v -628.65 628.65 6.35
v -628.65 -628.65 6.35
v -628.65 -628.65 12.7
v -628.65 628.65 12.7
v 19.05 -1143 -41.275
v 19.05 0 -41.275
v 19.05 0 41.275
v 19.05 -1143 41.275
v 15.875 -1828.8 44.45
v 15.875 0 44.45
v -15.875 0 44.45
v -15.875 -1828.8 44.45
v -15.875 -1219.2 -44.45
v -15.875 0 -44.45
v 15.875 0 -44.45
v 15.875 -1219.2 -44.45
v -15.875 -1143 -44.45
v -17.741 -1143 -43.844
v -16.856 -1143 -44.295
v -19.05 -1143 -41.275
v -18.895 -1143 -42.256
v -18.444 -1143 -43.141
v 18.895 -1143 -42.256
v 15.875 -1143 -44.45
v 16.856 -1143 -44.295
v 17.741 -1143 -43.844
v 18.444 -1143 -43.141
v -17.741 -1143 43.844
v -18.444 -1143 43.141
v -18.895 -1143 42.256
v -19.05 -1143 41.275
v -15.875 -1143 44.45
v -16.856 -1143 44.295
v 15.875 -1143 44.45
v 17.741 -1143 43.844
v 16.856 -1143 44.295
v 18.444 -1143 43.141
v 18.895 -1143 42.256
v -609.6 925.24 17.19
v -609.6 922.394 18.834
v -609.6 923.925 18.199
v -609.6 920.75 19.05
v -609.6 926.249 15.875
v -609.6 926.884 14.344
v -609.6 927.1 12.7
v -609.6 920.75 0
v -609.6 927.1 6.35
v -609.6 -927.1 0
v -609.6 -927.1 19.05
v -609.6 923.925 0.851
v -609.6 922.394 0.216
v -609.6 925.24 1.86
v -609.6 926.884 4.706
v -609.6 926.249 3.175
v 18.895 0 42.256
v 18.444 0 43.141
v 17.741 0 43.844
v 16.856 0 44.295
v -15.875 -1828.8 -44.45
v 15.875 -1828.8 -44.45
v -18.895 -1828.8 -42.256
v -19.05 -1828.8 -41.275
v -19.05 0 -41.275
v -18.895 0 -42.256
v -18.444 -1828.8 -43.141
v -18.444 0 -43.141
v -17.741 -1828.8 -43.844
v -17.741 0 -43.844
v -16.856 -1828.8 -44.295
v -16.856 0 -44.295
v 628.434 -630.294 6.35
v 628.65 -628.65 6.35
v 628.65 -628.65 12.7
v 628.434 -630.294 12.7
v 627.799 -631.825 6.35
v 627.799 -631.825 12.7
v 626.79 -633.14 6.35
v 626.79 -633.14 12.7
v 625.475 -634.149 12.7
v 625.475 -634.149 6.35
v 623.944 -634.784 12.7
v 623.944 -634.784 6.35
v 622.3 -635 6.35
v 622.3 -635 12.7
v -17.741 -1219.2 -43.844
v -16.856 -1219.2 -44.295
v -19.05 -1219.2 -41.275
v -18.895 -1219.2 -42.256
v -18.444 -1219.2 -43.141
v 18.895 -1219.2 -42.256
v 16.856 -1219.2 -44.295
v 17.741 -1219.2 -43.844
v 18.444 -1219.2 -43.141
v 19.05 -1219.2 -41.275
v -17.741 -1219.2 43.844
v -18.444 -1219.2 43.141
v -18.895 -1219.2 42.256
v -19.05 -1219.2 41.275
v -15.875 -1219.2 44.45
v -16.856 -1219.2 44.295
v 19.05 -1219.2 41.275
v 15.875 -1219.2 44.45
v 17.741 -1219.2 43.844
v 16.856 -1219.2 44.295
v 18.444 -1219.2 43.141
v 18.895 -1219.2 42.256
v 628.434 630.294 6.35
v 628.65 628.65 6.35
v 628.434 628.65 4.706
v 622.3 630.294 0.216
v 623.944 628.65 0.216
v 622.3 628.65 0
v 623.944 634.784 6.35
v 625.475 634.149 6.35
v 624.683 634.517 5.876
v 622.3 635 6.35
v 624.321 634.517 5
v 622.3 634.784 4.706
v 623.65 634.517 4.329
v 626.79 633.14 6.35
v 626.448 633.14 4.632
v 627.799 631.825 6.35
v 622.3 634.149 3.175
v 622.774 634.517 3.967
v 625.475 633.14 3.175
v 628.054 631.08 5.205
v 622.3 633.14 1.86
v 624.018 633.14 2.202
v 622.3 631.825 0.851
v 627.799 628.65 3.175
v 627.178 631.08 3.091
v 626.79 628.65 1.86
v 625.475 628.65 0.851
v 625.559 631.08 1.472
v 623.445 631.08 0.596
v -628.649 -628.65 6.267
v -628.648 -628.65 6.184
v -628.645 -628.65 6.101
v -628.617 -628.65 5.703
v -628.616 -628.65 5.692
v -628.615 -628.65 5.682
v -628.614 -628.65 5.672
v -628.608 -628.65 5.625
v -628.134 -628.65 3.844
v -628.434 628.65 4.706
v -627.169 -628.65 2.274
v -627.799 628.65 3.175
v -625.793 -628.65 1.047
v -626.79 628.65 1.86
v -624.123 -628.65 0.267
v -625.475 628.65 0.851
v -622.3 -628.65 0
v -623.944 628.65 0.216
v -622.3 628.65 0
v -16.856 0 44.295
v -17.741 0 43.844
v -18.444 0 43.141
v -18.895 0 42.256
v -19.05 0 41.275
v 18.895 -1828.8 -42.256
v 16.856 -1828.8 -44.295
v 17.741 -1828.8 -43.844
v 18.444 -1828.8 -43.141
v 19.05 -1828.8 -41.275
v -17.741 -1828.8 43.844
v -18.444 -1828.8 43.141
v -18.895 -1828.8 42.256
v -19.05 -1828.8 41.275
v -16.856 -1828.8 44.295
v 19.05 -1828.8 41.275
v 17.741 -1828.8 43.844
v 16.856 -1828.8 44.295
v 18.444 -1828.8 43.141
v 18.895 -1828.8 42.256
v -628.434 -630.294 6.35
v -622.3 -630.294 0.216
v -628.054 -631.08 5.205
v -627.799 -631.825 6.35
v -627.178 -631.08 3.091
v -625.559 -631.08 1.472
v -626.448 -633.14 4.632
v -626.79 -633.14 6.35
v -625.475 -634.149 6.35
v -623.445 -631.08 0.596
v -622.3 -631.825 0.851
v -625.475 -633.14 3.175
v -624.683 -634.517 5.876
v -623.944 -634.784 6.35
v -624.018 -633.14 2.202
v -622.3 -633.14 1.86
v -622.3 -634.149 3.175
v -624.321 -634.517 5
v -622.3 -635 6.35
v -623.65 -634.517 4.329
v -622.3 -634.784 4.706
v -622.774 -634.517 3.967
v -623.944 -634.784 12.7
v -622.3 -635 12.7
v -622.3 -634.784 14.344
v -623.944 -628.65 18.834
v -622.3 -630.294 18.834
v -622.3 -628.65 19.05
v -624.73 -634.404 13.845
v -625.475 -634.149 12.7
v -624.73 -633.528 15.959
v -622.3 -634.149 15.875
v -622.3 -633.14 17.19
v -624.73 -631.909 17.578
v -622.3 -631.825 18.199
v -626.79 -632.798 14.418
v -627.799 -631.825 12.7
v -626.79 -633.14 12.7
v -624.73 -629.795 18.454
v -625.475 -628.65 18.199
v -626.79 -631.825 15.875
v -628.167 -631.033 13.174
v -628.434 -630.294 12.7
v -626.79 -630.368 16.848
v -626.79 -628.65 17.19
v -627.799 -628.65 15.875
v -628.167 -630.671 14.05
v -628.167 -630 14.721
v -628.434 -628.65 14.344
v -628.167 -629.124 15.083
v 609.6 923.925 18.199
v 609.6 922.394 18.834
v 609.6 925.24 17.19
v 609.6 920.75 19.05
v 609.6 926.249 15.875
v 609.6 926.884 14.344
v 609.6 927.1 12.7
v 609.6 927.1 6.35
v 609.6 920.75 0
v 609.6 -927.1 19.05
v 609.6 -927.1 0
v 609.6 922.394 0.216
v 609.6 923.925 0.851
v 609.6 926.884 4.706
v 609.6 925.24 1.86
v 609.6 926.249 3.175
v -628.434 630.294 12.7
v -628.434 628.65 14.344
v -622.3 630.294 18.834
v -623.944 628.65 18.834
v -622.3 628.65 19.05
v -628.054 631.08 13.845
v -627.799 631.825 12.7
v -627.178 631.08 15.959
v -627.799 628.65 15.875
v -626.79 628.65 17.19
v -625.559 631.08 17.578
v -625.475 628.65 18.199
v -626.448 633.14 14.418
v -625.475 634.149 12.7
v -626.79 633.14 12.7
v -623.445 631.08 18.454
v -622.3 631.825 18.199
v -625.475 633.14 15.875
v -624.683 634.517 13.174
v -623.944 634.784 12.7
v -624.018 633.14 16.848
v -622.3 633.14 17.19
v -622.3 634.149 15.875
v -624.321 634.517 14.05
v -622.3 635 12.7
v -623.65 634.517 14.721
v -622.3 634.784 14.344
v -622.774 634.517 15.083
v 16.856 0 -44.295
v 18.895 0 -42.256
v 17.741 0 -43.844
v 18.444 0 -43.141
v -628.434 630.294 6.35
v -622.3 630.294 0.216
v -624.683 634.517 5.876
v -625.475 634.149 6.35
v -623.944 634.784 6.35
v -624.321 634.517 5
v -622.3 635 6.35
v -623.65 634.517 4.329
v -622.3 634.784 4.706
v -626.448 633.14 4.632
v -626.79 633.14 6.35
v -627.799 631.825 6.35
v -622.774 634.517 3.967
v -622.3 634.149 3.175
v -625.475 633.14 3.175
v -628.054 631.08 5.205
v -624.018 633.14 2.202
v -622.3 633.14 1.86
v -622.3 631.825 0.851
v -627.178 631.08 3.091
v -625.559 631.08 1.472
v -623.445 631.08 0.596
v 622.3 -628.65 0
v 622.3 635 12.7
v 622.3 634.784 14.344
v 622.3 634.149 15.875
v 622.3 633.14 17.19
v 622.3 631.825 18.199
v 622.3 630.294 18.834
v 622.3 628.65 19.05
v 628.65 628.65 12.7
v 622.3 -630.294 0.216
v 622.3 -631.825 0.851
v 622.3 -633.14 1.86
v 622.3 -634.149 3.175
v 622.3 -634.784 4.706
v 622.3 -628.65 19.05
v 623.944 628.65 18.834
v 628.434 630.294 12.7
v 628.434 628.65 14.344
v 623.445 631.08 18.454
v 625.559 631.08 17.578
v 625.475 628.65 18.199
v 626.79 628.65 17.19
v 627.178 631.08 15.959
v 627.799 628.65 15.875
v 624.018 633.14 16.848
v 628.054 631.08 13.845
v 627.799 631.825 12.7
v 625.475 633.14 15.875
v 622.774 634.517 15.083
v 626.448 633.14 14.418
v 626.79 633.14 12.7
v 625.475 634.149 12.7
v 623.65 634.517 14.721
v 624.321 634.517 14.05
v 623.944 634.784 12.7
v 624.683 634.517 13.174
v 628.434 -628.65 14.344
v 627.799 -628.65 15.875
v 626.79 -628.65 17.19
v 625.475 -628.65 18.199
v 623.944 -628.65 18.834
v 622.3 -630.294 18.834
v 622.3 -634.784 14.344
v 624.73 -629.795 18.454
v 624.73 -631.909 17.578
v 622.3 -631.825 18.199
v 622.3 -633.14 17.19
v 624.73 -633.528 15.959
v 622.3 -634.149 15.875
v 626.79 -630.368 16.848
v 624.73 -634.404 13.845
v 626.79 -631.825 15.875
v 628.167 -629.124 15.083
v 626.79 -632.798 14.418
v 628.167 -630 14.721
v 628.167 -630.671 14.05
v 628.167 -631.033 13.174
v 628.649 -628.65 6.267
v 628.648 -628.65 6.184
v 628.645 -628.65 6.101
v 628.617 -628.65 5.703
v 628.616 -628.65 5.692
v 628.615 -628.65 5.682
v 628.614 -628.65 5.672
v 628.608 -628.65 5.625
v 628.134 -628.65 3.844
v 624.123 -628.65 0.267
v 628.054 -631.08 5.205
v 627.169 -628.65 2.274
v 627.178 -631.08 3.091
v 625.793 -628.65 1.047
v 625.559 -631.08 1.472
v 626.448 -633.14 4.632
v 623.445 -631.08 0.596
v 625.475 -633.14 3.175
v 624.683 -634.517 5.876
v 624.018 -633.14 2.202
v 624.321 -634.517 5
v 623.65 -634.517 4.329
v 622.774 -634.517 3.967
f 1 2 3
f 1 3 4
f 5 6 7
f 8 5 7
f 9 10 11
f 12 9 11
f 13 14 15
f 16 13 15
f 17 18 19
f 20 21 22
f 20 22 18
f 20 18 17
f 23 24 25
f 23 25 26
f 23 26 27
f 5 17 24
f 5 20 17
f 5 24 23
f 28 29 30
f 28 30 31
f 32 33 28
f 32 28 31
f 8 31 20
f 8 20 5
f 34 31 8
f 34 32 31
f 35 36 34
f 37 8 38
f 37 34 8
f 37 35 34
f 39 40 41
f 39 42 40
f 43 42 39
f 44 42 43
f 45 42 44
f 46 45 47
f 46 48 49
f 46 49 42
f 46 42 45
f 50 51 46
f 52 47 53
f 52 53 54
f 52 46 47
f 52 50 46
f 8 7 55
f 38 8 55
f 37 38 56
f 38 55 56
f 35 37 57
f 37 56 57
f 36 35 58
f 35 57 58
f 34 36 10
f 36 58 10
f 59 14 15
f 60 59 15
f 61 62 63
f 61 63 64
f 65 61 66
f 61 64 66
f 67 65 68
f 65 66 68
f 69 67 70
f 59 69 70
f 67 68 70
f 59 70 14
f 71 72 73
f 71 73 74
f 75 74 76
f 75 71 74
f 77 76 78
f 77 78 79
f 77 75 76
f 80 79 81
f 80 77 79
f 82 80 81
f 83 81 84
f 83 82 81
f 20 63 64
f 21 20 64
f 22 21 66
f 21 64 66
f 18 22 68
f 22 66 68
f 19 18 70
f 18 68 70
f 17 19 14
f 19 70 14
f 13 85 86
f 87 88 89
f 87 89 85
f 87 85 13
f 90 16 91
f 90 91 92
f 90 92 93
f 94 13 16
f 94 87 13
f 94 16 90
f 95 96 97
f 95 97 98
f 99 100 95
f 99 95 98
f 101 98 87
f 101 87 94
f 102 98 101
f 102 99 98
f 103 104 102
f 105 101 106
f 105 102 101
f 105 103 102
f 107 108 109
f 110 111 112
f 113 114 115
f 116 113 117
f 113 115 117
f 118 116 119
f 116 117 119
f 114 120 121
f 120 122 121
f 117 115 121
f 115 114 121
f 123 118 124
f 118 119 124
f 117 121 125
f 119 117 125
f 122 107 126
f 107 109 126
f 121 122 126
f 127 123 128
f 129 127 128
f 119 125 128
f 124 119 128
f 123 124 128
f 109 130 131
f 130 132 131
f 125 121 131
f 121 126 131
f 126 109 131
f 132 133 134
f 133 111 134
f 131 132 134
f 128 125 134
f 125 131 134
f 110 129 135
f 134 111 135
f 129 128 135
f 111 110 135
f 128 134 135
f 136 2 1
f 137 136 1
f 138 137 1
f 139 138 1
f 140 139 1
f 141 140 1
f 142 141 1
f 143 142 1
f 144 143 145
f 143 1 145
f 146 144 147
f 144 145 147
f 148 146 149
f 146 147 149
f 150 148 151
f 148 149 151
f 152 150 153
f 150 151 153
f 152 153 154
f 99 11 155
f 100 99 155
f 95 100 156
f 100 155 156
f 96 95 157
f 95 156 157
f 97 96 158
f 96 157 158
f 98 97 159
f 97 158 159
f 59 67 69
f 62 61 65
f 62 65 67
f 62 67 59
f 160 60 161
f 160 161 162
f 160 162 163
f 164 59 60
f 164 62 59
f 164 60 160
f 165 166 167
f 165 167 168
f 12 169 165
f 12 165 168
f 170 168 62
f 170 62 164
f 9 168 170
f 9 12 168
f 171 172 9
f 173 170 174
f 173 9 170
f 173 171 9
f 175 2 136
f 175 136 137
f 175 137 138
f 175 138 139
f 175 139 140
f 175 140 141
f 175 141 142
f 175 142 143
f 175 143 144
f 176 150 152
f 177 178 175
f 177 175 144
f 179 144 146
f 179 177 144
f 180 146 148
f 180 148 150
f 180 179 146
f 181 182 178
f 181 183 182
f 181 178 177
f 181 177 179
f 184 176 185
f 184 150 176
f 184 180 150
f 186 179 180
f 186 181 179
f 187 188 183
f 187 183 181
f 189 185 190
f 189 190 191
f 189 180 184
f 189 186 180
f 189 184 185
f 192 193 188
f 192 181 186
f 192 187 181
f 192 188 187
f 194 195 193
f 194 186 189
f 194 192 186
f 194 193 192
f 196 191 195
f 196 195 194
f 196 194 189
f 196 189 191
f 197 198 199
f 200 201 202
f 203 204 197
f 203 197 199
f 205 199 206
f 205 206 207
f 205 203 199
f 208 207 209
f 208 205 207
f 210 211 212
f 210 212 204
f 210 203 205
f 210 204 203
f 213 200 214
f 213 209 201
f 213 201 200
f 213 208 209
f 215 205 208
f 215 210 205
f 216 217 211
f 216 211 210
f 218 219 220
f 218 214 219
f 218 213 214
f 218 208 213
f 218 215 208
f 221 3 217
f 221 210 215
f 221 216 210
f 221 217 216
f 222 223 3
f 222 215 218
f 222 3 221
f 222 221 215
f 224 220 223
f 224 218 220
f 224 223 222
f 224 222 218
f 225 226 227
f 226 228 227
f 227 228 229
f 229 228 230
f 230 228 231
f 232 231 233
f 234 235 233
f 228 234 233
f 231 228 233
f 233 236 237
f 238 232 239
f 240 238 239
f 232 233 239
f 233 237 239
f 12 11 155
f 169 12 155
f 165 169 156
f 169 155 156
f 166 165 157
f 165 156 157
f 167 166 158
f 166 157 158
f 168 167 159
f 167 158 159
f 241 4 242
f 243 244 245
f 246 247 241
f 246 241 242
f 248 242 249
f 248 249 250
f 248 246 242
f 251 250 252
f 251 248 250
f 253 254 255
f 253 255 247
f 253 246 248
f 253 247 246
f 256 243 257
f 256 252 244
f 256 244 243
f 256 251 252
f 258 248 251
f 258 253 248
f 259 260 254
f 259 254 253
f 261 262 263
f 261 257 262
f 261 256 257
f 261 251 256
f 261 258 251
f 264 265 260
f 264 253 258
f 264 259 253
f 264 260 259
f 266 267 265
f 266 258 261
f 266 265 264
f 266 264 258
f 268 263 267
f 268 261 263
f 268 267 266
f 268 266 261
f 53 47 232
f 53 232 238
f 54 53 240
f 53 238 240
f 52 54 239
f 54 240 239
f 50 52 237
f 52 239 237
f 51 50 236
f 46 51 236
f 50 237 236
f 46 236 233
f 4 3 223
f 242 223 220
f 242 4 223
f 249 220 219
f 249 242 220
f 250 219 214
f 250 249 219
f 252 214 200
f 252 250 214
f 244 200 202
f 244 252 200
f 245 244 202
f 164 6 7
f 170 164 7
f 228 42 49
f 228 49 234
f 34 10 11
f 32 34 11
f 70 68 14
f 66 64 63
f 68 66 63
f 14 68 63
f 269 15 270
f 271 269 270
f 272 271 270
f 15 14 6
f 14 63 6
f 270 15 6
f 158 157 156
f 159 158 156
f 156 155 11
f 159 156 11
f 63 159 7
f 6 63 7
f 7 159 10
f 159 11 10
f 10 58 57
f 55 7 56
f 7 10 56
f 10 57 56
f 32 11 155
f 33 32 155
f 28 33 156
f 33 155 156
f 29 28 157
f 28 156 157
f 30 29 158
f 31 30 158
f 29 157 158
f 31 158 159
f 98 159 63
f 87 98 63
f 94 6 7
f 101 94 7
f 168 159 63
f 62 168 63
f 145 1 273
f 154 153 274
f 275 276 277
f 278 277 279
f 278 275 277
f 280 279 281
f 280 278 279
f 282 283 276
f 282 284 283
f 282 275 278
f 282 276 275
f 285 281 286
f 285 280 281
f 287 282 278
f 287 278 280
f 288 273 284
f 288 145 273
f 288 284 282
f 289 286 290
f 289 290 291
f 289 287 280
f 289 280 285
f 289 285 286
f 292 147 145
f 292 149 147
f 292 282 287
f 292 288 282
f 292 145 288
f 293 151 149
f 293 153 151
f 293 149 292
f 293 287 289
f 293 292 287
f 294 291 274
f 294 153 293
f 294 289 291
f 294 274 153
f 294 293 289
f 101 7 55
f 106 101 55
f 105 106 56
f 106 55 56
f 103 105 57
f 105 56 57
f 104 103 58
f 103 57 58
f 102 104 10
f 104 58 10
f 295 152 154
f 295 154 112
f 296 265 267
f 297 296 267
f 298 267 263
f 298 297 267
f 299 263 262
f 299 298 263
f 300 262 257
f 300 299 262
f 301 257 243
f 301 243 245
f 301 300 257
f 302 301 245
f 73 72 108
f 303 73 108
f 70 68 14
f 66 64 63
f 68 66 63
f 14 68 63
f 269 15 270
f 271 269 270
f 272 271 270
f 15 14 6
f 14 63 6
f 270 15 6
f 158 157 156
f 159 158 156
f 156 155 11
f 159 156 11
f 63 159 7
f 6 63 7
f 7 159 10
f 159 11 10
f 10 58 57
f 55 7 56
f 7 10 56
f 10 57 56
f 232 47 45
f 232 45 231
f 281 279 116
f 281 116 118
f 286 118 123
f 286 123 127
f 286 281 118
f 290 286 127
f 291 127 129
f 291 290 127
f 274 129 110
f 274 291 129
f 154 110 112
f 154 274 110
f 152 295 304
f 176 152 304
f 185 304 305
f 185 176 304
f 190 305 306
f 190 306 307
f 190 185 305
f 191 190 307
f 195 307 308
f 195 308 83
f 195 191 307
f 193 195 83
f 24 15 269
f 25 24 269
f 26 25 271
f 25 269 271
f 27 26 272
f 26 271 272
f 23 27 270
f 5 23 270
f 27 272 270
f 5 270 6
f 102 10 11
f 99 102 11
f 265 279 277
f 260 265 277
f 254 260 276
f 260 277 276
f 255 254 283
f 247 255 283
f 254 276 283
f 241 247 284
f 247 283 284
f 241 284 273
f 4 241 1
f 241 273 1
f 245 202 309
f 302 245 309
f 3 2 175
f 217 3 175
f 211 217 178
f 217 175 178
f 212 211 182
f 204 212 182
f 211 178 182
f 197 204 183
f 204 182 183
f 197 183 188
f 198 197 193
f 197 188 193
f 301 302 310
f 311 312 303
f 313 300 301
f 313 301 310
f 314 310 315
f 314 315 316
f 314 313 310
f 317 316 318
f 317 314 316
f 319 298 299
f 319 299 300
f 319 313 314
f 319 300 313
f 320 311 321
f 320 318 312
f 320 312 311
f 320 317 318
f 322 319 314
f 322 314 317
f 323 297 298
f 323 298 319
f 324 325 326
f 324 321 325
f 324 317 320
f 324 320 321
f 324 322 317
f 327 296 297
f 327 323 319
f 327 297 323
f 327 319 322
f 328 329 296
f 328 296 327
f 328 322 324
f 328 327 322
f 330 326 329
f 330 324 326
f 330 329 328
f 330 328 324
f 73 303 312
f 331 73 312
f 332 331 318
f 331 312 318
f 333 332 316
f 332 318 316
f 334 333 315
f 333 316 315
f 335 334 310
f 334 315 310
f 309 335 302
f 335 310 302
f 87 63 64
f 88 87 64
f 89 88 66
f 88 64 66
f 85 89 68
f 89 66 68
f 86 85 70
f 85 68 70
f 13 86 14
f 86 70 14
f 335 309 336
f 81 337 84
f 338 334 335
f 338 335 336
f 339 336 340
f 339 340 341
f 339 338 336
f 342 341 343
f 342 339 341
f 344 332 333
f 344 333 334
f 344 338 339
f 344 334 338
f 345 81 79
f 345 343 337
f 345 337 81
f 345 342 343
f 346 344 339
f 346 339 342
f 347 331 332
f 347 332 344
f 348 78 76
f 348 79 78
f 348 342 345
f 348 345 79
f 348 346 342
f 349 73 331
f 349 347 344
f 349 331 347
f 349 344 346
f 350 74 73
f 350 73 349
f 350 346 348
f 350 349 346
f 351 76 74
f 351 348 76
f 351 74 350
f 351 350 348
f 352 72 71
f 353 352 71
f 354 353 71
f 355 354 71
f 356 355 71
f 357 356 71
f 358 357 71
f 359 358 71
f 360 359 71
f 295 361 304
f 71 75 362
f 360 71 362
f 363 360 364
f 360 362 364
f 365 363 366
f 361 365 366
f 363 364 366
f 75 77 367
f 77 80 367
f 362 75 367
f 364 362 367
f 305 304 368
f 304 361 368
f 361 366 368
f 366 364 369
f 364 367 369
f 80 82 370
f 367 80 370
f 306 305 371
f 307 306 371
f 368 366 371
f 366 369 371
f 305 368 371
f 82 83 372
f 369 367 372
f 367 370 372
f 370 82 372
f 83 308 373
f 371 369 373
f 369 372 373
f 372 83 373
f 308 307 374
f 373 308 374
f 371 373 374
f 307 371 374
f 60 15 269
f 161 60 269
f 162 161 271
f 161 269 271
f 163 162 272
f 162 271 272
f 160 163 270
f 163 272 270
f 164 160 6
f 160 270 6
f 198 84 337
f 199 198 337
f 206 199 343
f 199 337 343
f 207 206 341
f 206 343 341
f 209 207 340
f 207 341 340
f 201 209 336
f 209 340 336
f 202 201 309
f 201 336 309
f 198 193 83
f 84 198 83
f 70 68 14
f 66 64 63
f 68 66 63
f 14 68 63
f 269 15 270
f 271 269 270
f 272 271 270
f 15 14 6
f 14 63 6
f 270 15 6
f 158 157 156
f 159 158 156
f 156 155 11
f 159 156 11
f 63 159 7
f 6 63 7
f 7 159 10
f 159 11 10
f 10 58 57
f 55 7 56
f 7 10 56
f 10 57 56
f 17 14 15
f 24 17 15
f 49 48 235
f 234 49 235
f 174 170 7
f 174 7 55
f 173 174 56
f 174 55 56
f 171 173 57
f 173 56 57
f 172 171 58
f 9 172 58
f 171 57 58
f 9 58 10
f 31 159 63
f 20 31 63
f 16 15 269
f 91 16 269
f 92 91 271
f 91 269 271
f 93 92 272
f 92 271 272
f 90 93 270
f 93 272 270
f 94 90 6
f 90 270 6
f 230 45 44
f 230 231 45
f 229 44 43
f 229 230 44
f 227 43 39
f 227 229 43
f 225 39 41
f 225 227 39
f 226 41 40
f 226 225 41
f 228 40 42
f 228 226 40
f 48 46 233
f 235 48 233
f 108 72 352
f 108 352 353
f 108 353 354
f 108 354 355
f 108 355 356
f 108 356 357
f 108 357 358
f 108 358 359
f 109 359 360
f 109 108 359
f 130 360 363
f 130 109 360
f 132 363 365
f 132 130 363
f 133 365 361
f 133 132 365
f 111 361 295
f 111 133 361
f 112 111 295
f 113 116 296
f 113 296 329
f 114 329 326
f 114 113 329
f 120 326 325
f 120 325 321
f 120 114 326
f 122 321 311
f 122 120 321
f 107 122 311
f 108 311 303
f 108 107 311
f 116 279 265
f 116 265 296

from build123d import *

# Parameters (mm, degrees)
F1_DEPTH     = 1219.2
F2_DEPTH     = 1143
F3_W         = 1257.3
F3_H         = 1270
F4_DEPTH     = 19.05
F5_R         = 6.35
F6_T1_DEPTH  = 1244.6
F6_T3_DEPTH  = 6.35
F6_S7_W      = 6.477
F6_S7_H      = 6.477
F6_T8_DEPTH  = 6.477
F6_S13_W     = 6.477
F6_S13_H     = 6.477
F6_T14_DEPTH = 6.477
F6_S19_W     = 6.477
F6_S19_H     = 6.477
F6_T20_DEPTH = 6.477
F6_S25_W     = 6.477
F6_S25_H     = 6.477
F6_T26_DEPTH = 6.477
F6_T30_ANGLE = 90
F6_T32_ANGLE = 90
F6_T34_ANGLE = 90
F6_T36_ANGLE = 90
F7_DEPTH     = 1828.8
F8_W         = 1219.2
F8_H         = 1854.2
F9_DEPTH     = 19.05
F10_R        = 6.35


# Not quite as in the source:
# - a fillet or chamfer that OpenCascade refuses, or shapes differently, is made with other operations: its cross-section is extruded or revolved along the edge and cut away or added


with BuildPart() as f1:
    # F0 (on Front) → F1 (new body)
    with BuildSketch(Plane.XZ):
        with BuildLine():
            ThreePointArc((19.05, 41.275), (18.1200640303, 43.5200640303), (15.875, 44.45))
            Line((15.875, 44.45), (-15.875, 44.45))
            ThreePointArc((-15.875, 44.45), (-18.1200640303, 43.5200640303), (-19.05, 41.275))
            Line((-19.05, 41.275), (-19.05, -41.275))
            ThreePointArc((-19.05, -41.275), (-18.1200640303, -43.5200640303), (-15.875, -44.45))
            Line((-15.875, -44.45), (15.875, -44.45))
            ThreePointArc((15.875, -44.45), (18.1200640303, -43.5200640303), (19.05, -41.275))
            Line((19.05, -41.275), (19.05, 41.275))
        make_face()
    extrude(amount=F1_DEPTH)


with BuildPart() as f2:
    # F0 (on Front) → F2 (new body)
    with BuildSketch(Plane.XZ):
        with BuildLine():
            ThreePointArc((19.05, 41.275), (18.1200640303, 43.5200640303), (15.875, 44.45))
            Line((15.875, 44.45), (-15.875, 44.45))
            ThreePointArc((-15.875, 44.45), (-18.1200640303, 43.5200640303), (-19.05, 41.275))
            Line((-19.05, 41.275), (-19.05, -41.275))
            ThreePointArc((-19.05, -41.275), (-18.1200640303, -43.5200640303), (-15.875, -44.45))
            Line((-15.875, -44.45), (15.875, -44.45))
            ThreePointArc((15.875, -44.45), (18.1200640303, -43.5200640303), (19.05, -41.275))
            Line((19.05, -41.275), (19.05, 41.275))
        make_face()
    extrude(amount=F2_DEPTH)


with BuildPart() as f4:
    # F3 (on Top) → F4 (new body)
    with BuildSketch(Plane.XY):
        Rectangle(F3_W, F3_H)
    extrude(amount=F4_DEPTH)

    # F5
    f5_edges = [f4.edges().sort_by_distance(p)[0] for p in [
        (-628.65, 0, 19.05),
        (0, -635, 19.05),
        (0, 635, 19.05),
        (628.65, 0, 19.05),
        (628.65, 0, 0),
        (-628.65, 0, 0),
    ]]
    fillet(f5_edges, radius=F5_R)

    # F6: fillet of radius 6.35 on 2 edges, made by hand

    # F6_s2 → F6_t1 (cut)
    with BuildSketch(Plane.YZ.offset(-622.3)):
        with BuildLine():
            ThreePointArc((-628.65, 0), (-633.1401280605, 1.8598719395), (-635, 6.35))
            Line((-635, 6.35), (-635.127, 6.35))
            Line((-635.127, 6.35), (-635.127, -0.127))
            Line((-635.127, -0.127), (-628.65, -0.127))
            Line((-628.65, -0.127), (-628.65, 0))
        make_face()
        with BuildLine():
            ThreePointArc((635, 6.35), (633.1401280605, 1.8598719395), (628.65, 0))
            Line((628.65, 0), (628.65, -0.127))
            Line((628.65, -0.127), (635.127, -0.127))
            Line((635.127, -0.127), (635.127, 6.35))
            Line((635.127, 6.35), (635, 6.35))
        make_face()
    extrude(amount=F6_T1_DEPTH, mode=Mode.SUBTRACT)

    # F6_s4 → F6_t3 (cut)
    with BuildSketch(Plane.XY.offset(6.35)):
        with BuildLine():
            ThreePointArc((-622.3, 635), (-626.7901280605, 633.1401280605), (-628.65, 628.65))
            Line((-628.65, 628.65), (-628.777, 628.65))
            Line((-628.777, 628.65), (-628.777, 635.127))
            Line((-628.777, 635.127), (-622.3, 635.127))
            Line((-622.3, 635.127), (-622.3, 635))
        make_face()
        with BuildLine():
            ThreePointArc((622.3, 635), (626.7901280605, 633.1401280605), (628.65, 628.65))
            Line((628.65, 628.65), (628.777, 628.65))
            Line((628.777, 628.65), (628.777, 635.127))
            Line((628.777, 635.127), (622.3, 635.127))
            Line((622.3, 635.127), (622.3, 635))
        make_face()
        with BuildLine():
            ThreePointArc((628.65, -628.65), (626.7901280605, -633.1401280605), (622.3, -635))
            Line((622.3, -635), (622.3, -635.127))
            Line((622.3, -635.127), (628.777, -635.127))
            Line((628.777, -635.127), (628.777, -628.65))
            Line((628.777, -628.65), (628.65, -628.65))
        make_face()
        with BuildLine():
            ThreePointArc((-628.65, -628.65), (-626.7901280605, -633.1401280605), (-622.3, -635))
            Line((-622.3, -635), (-622.3, -635.127))
            Line((-622.3, -635.127), (-628.777, -635.127))
            Line((-628.777, -635.127), (-628.777, -628.65))
            Line((-628.777, -628.65), (-628.65, -628.65))
        make_face()
    extrude(amount=F6_T3_DEPTH, mode=Mode.SUBTRACT)


with BuildPart() as f6_tool6:
    # F6_s7 → F6_t8 (new body)
    with BuildSketch(Plane.XZ.offset(-628.65)):
        with Locations((-625.5385, 15.9385)):
            Rectangle(F6_S7_W, F6_S7_H)
    extrude(amount=-F6_T8_DEPTH)

    # F6_s9 → F6_t10 (revolve, cut)
    with BuildSketch(Plane(origin=(-622.3, 628.65, 12.7), x_dir=(0.7071067812, 0, -0.7071067812), z_dir=(0.7071067812, 0, 0.7071067812))):
        with BuildLine():
            ThreePointArc((0, -6.35), (6.35, 0), (0, 6.35))
            Line((0, 6.35), (0, -6.35))
        make_face()
    revolve(axis=Axis((-622.3, 628.65, 12.7), (0, 1, 0)), mode=Mode.SUBTRACT)


with BuildPart() as f4_1:
    add(f4.part)

    # F6_t5: cut F6_tool6
    add(f6_tool6.part, mode=Mode.SUBTRACT)


with BuildPart() as f6_tool12:
    # F6_s13 → F6_t14 (new body)
    with BuildSketch(Plane.XZ.offset(-628.65)):
        with Locations((625.5385, 15.9385)):
            Rectangle(F6_S13_W, F6_S13_H)
    extrude(amount=-F6_T14_DEPTH)

    # F6_s15 → F6_t16 (revolve, cut)
    with BuildSketch(Plane(origin=(622.3, 628.65, 12.7), x_dir=(-0.7071067812, 0, -0.7071067812), z_dir=(0.7071067812, 0, -0.7071067812))):
        with BuildLine():
            ThreePointArc((0, -6.35), (6.35, 0), (0, 6.35))
            Line((0, 6.35), (0, -6.35))
        make_face()
    revolve(axis=Axis((622.3, 628.65, 12.7), (0, 1, 0)), mode=Mode.SUBTRACT)


with BuildPart() as f4_2:
    add(f4_1.part)

    # F6_t11: cut F6_tool12
    add(f6_tool12.part, mode=Mode.SUBTRACT)


with BuildPart() as f6_tool18:
    # F6_s19 → F6_t20 (new body)
    with BuildSketch(Plane.YZ.offset(622.3)):
        with Locations((-631.8885, 15.9385)):
            Rectangle(F6_S19_W, F6_S19_H)
    extrude(amount=F6_T20_DEPTH)

    # F6_s21 → F6_t22 (revolve, cut)
    with BuildSketch(Plane(origin=(622.3, -628.65, 12.7), x_dir=(0, 0.7071067812, -0.7071067812), z_dir=(0, -0.7071067812, -0.7071067812))):
        with BuildLine():
            ThreePointArc((0, -6.35), (6.35, 0), (0, 6.35))
            Line((0, 6.35), (0, -6.35))
        make_face()
    revolve(axis=Axis((622.3, -628.65, 12.7), (1, 0, 0)), mode=Mode.SUBTRACT)


with BuildPart() as f4_3:
    add(f4_2.part)

    # F6_t17: cut F6_tool18
    add(f6_tool18.part, mode=Mode.SUBTRACT)


with BuildPart() as f6_tool24:
    # F6_s25 → F6_t26 (new body)
    with BuildSketch(Plane.YZ.offset(-622.3)):
        with Locations((-631.8885, 15.9385)):
            Rectangle(F6_S25_W, F6_S25_H)
    extrude(amount=-F6_T26_DEPTH)

    # F6_s27 → F6_t28 (revolve, cut)
    with BuildSketch(Plane(origin=(-622.3, -628.65, 12.7), x_dir=(0, 0.7071067812, -0.7071067812), z_dir=(0, 0.7071067812, 0.7071067812))):
        with BuildLine():
            ThreePointArc((0, -6.35), (6.35, 0), (0, 6.35))
            Line((0, 6.35), (0, -6.35))
        make_face()
    revolve(axis=Axis((-622.3, -628.65, 12.7), (-1, 0, 0)), mode=Mode.SUBTRACT)


with BuildPart() as f4_4:
    add(f4_3.part)

    # F6_t23: cut F6_tool24
    add(f6_tool24.part, mode=Mode.SUBTRACT)

    # F6_s29 → F6_t30 (revolve, cut)
    with BuildSketch(Plane.XY.offset(6.35)):
        with BuildLine():
            ThreePointArc((622.3, 635), (626.7901280605, 633.1401280605), (628.65, 628.65))
            Line((628.65, 628.65), (628.777, 628.65))
            Line((628.777, 628.65), (628.777, 635.127))
            Line((628.777, 635.127), (622.3, 635.127))
            Line((622.3, 635.127), (622.3, 635))
        make_face()
    revolve(axis=Axis((622.3, 635, 6.35), (0, 1, 0)), revolution_arc=F6_T30_ANGLE, mode=Mode.SUBTRACT)

    # F6_s31 → F6_t32 (revolve, cut)
    with BuildSketch(Plane.XY.offset(6.35)):
        with BuildLine():
            ThreePointArc((-622.3, 635), (-626.7901280605, 633.1401280605), (-628.65, 628.65))
            Line((-628.65, 628.65), (-628.777, 628.65))
            Line((-628.777, 628.65), (-628.777, 635.127))
            Line((-628.777, 635.127), (-622.3, 635.127))
            Line((-622.3, 635.127), (-622.3, 635))
        make_face()
    revolve(axis=Axis((-622.3, 635, 6.35), (0, -1, 0)), revolution_arc=F6_T32_ANGLE, mode=Mode.SUBTRACT)

    # F6_s33 → F6_t34 (revolve, cut)
    with BuildSketch(Plane.XY.offset(6.35)):
        with BuildLine():
            ThreePointArc((-628.65, -628.65), (-626.7901280605, -633.1401280605), (-622.3, -635))
            Line((-622.3, -635), (-622.3, -635.127))
            Line((-622.3, -635.127), (-628.777, -635.127))
            Line((-628.777, -635.127), (-628.777, -628.65))
            Line((-628.777, -628.65), (-628.65, -628.65))
        make_face()
    revolve(axis=Axis((-622.3, -635, 6.35), (0, -1, 0)), revolution_arc=F6_T34_ANGLE, mode=Mode.SUBTRACT)

    # F6_s35 → F6_t36 (revolve, cut)
    with BuildSketch(Plane.XY.offset(6.35)):
        with BuildLine():
            ThreePointArc((628.65, -628.65), (626.7901280605, -633.1401280605), (622.3, -635))
            Line((622.3, -635), (622.3, -635.127))
            Line((622.3, -635.127), (628.777, -635.127))
            Line((628.777, -635.127), (628.777, -628.65))
            Line((628.777, -628.65), (628.65, -628.65))
        make_face()
    revolve(axis=Axis((622.3, -635, 6.35), (0, 1, 0)), revolution_arc=F6_T36_ANGLE, mode=Mode.SUBTRACT)


with BuildPart() as f7:
    # F0 (on Front) → F7 (new body)
    with BuildSketch(Plane.XZ):
        with BuildLine():
            ThreePointArc((19.05, 41.275), (18.1200640303, 43.5200640303), (15.875, 44.45))
            Line((15.875, 44.45), (-15.875, 44.45))
            ThreePointArc((-15.875, 44.45), (-18.1200640303, 43.5200640303), (-19.05, 41.275))
            Line((-19.05, 41.275), (-19.05, -41.275))
            ThreePointArc((-19.05, -41.275), (-18.1200640303, -43.5200640303), (-15.875, -44.45))
            Line((-15.875, -44.45), (15.875, -44.45))
            ThreePointArc((15.875, -44.45), (18.1200640303, -43.5200640303), (19.05, -41.275))
            Line((19.05, -41.275), (19.05, 41.275))
        make_face()
    extrude(amount=F7_DEPTH)


with BuildPart() as f9:
    # F8 (on Top) → F9 (new body)
    with BuildSketch(Plane.XY):
        Rectangle(F8_W, F8_H)
    extrude(amount=F9_DEPTH)

    # F10
    f10_edges = [f9.edges().sort_by_distance(p)[0] for p in [
        (0, 927.1, 19.05),
        (0, 927.1, 0),
    ]]
    fillet(f10_edges, radius=F10_R)


solid = Compound([f1.part, f2.part, f4_4.part, f7.part, f9.part])
